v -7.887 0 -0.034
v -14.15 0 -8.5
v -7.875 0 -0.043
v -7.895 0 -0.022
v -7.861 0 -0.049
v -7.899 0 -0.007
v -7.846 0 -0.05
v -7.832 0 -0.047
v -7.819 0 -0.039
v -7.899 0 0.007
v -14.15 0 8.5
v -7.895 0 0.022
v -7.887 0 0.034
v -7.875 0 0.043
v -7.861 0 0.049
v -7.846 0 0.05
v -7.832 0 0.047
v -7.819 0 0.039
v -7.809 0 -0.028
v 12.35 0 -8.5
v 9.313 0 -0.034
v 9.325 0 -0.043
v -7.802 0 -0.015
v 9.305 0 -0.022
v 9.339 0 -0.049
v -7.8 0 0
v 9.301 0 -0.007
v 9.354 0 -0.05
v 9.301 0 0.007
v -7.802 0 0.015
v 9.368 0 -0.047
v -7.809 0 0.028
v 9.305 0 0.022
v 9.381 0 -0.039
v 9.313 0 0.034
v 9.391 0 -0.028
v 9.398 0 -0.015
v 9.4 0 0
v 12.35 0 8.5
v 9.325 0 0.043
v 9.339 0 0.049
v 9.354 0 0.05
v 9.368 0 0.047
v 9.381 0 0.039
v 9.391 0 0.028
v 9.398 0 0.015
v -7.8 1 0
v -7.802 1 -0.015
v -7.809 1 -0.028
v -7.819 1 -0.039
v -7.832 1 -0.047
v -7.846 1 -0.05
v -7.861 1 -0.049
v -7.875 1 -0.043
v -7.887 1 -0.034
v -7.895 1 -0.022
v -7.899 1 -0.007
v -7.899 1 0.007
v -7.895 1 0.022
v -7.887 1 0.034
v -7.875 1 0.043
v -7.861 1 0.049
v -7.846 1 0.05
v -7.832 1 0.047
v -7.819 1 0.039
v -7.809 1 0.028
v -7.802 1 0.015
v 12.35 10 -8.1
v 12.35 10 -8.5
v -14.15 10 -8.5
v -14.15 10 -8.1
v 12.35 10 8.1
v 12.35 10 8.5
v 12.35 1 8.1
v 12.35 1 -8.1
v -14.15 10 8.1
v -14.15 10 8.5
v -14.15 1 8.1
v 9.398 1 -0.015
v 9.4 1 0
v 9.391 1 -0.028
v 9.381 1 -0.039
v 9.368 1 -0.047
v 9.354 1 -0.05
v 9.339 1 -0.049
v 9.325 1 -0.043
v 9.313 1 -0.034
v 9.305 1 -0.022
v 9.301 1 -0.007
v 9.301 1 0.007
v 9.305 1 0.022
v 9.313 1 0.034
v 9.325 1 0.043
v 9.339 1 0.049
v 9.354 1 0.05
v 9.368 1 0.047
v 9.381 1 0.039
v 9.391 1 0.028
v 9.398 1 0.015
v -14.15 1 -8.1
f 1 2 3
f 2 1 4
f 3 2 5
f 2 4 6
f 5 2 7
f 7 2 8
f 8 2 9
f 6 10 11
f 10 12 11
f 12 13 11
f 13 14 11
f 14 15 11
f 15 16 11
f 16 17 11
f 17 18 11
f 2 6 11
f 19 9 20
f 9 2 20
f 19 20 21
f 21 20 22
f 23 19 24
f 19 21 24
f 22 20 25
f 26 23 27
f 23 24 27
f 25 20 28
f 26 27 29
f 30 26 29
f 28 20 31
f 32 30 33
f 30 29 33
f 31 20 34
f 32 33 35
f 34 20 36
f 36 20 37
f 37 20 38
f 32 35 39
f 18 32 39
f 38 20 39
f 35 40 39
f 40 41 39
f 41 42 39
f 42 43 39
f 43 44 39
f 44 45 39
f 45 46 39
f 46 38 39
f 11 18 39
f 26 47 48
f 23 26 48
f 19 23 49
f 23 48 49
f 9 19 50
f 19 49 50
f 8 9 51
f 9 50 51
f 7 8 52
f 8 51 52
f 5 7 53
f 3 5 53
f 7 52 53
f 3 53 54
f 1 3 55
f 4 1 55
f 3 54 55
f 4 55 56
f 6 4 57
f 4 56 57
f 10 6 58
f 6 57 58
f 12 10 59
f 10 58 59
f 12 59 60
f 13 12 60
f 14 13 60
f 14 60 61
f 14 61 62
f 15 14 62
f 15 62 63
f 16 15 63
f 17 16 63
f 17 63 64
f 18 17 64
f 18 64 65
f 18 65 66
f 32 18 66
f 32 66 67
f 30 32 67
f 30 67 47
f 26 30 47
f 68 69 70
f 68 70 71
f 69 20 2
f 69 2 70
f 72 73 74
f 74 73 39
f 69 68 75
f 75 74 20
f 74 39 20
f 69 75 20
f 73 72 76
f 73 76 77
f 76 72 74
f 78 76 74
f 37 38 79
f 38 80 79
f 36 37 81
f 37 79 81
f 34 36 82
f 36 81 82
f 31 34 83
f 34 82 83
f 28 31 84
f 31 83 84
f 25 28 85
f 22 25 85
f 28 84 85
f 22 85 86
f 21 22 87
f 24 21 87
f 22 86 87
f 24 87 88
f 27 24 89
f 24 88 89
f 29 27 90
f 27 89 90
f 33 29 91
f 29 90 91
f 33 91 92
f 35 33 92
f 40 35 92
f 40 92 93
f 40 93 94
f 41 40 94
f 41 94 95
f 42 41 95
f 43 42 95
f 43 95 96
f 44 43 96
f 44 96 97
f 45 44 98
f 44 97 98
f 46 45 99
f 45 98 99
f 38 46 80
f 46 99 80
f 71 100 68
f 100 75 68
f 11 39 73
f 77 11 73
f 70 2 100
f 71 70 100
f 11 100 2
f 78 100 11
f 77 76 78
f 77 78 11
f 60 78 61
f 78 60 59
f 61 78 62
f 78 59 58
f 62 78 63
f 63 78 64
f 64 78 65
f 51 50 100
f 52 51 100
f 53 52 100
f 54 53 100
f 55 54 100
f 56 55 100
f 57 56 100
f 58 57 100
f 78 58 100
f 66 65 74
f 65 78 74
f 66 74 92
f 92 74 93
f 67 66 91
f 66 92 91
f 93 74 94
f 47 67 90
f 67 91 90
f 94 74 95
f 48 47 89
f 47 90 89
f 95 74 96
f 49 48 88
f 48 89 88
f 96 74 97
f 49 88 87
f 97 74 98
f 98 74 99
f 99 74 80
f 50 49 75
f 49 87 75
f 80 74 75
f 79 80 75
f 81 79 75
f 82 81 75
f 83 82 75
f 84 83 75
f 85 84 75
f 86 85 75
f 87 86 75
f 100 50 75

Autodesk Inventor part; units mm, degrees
ref_plane "YZ Plane" through (0, 0, 0) normal (1, 0, 0) x (0, 1, 0)
ref_plane "XZ Plane" through (0, 0, 0) normal (0, 1, 0) x (-1, 0, 0)
ref_plane "XY Plane" through (0, 0, 0) normal (0, 0, 1) x (1, 0, 0)
sketch "Sketch1" plane through (0, 0, 0) normal (0, 1, 0) x (-1, 0, 0)
  line L0 (12.35, 8.5) -> (-12.35, 8.5)
  line L1 (-12.35, 8.5) -> (-12.35, -8.5)
  line L2 (-12.35, -8.5) -> (12.35, -8.5)
  line L3 (12.35, -8.5) -> (12.35, 8.5)
  line L4 (12.35, 8.5) -> (-12.35, -8.5) construction
  line L5 (-12.35, 8.5) -> (12.35, -8.5) construction
  point P0 (0, 0)
  dimension "d0" = 24.7
  dimension "d1" = 17
extrude "Extrusion1" add sketch "Sketch1" along normal blind 10
sketch "Sketch2" plane through (0, 10, 0) normal (0, 1, 0) x (1, 0, 0)
  line L0 (-12.35, 8.1) -> (12.35, 8.1)
  line L1 (12.35, 8.1) -> (12.35, -8.1)
  line L2 (12.35, -8.1) -> (-12.35, -8.1)
  line L3 (-12.35, -8.1) -> (-12.35, 8.1)
  line L4 (-12.35, 8.1) -> (12.35, -8.1) construction
  line L5 (12.35, 8.1) -> (-12.35, -8.1) construction
  point P0 (0, 0)
  dimension "d4" = 24.7
  dimension "d5" = 16.2
extrude "Extrusion2" cut sketch "Sketch2" against normal blind 9
sketch "Sketch3" plane through (0, 0, 0) normal (0, -1, 0) x (1, 0, 0)
  line L0 (-12.35, -8.5) -> (-12.35, 8.5) projected
  line L1 (12.35, 8.5) -> (12.35, -8.5) projected
  line L2 (-12.35, 0) -> (-9.35, 0)
  circle A0 centre (-9.35, 0) radius 1.5
  line L3 (12.35, 0) -> (9.35, 0)
  circle A1 centre (9.35, 0) radius 1.5
  point P0 (0, 0)
  dimension "d8" = 3
  dimension "d9" = 3
  dimension "d10" = 3
  dimension "d11" = 3
extrude "Extrusion3" cut sketch "Sketch3" against normal blind 1
sketch "Sketch4" plane through (-12.35, 0, -8.5) normal (-1, 0, 0) x (0, 0, 1)
  line L0 (0.4, 1) -> (0.4, 10) projected
  line L1 (0, 10) -> (0.4, 10) projected
  line L2 (0, 0) -> (0, 10) projected
  line L3 (0, 0) -> (17, 0) projected
  line L4 (17, 0) -> (17, 10) projected
  line L5 (16.6, 10) -> (17, 10) projected
  line L6 (16.6, 10) -> (16.6, 1) projected
  line L7 (16.6, 1) -> (0.4, 1) projected
  point P0 (8.5, 0)
extrude "Extrusion4" add sketch "Sketch4" along normal blind 2
sketch "Sketch5" plane through (-14.35, 0, -8.5) normal (-1, 0, 0) x (0, 0, 1)
  line L0 (0.4, 1) -> (0.4, 10) projected
  line L1 (0.4, 10) -> (0, 10) projected
  line L2 (0, 10) -> (0, 0) projected
  line L3 (0, 0) -> (17, 0) projected
  line L4 (17, 0) -> (17, 10) projected
  line L5 (17, 10) -> (16.6, 10) projected
  line L6 (16.6, 10) -> (16.6, 1) projected
  line L7 (16.6, 1) -> (0.4, 1) projected
  point P0 (8.5, 0)
extrude "Extrusion5" cut sketch "Sketch5" against normal blind 0.2
sketch "Sketch6" plane through (0, 0, 0) normal (0, -1, 0) x (1, 0, 0)
  line L0 (-14.15, 8.5) -> (-14.15, -8.5) projected
  line L1 (-14.15, 8.5) -> (12.35, 8.5) projected
  circle A0 centre (-9.35, 0) radius 1.5 projected
  line L2 (-14.15, 0) -> (-12.15, 0)
  line L3 (-12.15, 0) -> (-10.15, 0)
  line L4 (-10.15, 0) -> (-7.15, 0)
  point P0 (0, 0)
  dimension "d18" = 2
  dimension "d19" = 2
  dimension "d20" = 3
extrude "Extrusion6" add sketch "Sketch6" against normal blind 1
sketch "Sketch7" plane through (0, 0, 0) normal (0, -1, 0) x (1, 0, 0)
  line L0 (-14.15, 8.5) -> (-14.15, -8.5) projected
  line L1 (-14.15, 8.5) -> (12.35, 8.5) projected
  line L2 (-14.15, 0) -> (-10.85, 0)
  line L3 (-10.85, 0) -> (-7.85, 0)
  circle A0 centre (-7.85, 0) radius 1.5
  point P0 (0, 0)
  dimension "d29" = 3.3
  dimension "d30" = 3
  dimension "d31" = 3
extrude "Extrusion7" cut sketch "Sketch7" against normal blind 1
sketch "Sketch8" plane through (0, 1, 0) normal (0, 1, 0) x (1, 0, 0)
  circle A0 centre (-7.85, 0) radius 1.5 projected
  circle A1 centre (9.35, 0) radius 1.5 projected
  circle A2 centre (9.35, 0) radius 0.05
  circle A3 centre (-7.85, 0) radius 0.05
  point P0 (0, 0)
  dimension "d34" = 0.1
  dimension "d35" = 0.1
extrude "Extrusion8" add sketch "Sketch8" against normal blind 1
properties part number "kolejnicka_ruka_sablona"
